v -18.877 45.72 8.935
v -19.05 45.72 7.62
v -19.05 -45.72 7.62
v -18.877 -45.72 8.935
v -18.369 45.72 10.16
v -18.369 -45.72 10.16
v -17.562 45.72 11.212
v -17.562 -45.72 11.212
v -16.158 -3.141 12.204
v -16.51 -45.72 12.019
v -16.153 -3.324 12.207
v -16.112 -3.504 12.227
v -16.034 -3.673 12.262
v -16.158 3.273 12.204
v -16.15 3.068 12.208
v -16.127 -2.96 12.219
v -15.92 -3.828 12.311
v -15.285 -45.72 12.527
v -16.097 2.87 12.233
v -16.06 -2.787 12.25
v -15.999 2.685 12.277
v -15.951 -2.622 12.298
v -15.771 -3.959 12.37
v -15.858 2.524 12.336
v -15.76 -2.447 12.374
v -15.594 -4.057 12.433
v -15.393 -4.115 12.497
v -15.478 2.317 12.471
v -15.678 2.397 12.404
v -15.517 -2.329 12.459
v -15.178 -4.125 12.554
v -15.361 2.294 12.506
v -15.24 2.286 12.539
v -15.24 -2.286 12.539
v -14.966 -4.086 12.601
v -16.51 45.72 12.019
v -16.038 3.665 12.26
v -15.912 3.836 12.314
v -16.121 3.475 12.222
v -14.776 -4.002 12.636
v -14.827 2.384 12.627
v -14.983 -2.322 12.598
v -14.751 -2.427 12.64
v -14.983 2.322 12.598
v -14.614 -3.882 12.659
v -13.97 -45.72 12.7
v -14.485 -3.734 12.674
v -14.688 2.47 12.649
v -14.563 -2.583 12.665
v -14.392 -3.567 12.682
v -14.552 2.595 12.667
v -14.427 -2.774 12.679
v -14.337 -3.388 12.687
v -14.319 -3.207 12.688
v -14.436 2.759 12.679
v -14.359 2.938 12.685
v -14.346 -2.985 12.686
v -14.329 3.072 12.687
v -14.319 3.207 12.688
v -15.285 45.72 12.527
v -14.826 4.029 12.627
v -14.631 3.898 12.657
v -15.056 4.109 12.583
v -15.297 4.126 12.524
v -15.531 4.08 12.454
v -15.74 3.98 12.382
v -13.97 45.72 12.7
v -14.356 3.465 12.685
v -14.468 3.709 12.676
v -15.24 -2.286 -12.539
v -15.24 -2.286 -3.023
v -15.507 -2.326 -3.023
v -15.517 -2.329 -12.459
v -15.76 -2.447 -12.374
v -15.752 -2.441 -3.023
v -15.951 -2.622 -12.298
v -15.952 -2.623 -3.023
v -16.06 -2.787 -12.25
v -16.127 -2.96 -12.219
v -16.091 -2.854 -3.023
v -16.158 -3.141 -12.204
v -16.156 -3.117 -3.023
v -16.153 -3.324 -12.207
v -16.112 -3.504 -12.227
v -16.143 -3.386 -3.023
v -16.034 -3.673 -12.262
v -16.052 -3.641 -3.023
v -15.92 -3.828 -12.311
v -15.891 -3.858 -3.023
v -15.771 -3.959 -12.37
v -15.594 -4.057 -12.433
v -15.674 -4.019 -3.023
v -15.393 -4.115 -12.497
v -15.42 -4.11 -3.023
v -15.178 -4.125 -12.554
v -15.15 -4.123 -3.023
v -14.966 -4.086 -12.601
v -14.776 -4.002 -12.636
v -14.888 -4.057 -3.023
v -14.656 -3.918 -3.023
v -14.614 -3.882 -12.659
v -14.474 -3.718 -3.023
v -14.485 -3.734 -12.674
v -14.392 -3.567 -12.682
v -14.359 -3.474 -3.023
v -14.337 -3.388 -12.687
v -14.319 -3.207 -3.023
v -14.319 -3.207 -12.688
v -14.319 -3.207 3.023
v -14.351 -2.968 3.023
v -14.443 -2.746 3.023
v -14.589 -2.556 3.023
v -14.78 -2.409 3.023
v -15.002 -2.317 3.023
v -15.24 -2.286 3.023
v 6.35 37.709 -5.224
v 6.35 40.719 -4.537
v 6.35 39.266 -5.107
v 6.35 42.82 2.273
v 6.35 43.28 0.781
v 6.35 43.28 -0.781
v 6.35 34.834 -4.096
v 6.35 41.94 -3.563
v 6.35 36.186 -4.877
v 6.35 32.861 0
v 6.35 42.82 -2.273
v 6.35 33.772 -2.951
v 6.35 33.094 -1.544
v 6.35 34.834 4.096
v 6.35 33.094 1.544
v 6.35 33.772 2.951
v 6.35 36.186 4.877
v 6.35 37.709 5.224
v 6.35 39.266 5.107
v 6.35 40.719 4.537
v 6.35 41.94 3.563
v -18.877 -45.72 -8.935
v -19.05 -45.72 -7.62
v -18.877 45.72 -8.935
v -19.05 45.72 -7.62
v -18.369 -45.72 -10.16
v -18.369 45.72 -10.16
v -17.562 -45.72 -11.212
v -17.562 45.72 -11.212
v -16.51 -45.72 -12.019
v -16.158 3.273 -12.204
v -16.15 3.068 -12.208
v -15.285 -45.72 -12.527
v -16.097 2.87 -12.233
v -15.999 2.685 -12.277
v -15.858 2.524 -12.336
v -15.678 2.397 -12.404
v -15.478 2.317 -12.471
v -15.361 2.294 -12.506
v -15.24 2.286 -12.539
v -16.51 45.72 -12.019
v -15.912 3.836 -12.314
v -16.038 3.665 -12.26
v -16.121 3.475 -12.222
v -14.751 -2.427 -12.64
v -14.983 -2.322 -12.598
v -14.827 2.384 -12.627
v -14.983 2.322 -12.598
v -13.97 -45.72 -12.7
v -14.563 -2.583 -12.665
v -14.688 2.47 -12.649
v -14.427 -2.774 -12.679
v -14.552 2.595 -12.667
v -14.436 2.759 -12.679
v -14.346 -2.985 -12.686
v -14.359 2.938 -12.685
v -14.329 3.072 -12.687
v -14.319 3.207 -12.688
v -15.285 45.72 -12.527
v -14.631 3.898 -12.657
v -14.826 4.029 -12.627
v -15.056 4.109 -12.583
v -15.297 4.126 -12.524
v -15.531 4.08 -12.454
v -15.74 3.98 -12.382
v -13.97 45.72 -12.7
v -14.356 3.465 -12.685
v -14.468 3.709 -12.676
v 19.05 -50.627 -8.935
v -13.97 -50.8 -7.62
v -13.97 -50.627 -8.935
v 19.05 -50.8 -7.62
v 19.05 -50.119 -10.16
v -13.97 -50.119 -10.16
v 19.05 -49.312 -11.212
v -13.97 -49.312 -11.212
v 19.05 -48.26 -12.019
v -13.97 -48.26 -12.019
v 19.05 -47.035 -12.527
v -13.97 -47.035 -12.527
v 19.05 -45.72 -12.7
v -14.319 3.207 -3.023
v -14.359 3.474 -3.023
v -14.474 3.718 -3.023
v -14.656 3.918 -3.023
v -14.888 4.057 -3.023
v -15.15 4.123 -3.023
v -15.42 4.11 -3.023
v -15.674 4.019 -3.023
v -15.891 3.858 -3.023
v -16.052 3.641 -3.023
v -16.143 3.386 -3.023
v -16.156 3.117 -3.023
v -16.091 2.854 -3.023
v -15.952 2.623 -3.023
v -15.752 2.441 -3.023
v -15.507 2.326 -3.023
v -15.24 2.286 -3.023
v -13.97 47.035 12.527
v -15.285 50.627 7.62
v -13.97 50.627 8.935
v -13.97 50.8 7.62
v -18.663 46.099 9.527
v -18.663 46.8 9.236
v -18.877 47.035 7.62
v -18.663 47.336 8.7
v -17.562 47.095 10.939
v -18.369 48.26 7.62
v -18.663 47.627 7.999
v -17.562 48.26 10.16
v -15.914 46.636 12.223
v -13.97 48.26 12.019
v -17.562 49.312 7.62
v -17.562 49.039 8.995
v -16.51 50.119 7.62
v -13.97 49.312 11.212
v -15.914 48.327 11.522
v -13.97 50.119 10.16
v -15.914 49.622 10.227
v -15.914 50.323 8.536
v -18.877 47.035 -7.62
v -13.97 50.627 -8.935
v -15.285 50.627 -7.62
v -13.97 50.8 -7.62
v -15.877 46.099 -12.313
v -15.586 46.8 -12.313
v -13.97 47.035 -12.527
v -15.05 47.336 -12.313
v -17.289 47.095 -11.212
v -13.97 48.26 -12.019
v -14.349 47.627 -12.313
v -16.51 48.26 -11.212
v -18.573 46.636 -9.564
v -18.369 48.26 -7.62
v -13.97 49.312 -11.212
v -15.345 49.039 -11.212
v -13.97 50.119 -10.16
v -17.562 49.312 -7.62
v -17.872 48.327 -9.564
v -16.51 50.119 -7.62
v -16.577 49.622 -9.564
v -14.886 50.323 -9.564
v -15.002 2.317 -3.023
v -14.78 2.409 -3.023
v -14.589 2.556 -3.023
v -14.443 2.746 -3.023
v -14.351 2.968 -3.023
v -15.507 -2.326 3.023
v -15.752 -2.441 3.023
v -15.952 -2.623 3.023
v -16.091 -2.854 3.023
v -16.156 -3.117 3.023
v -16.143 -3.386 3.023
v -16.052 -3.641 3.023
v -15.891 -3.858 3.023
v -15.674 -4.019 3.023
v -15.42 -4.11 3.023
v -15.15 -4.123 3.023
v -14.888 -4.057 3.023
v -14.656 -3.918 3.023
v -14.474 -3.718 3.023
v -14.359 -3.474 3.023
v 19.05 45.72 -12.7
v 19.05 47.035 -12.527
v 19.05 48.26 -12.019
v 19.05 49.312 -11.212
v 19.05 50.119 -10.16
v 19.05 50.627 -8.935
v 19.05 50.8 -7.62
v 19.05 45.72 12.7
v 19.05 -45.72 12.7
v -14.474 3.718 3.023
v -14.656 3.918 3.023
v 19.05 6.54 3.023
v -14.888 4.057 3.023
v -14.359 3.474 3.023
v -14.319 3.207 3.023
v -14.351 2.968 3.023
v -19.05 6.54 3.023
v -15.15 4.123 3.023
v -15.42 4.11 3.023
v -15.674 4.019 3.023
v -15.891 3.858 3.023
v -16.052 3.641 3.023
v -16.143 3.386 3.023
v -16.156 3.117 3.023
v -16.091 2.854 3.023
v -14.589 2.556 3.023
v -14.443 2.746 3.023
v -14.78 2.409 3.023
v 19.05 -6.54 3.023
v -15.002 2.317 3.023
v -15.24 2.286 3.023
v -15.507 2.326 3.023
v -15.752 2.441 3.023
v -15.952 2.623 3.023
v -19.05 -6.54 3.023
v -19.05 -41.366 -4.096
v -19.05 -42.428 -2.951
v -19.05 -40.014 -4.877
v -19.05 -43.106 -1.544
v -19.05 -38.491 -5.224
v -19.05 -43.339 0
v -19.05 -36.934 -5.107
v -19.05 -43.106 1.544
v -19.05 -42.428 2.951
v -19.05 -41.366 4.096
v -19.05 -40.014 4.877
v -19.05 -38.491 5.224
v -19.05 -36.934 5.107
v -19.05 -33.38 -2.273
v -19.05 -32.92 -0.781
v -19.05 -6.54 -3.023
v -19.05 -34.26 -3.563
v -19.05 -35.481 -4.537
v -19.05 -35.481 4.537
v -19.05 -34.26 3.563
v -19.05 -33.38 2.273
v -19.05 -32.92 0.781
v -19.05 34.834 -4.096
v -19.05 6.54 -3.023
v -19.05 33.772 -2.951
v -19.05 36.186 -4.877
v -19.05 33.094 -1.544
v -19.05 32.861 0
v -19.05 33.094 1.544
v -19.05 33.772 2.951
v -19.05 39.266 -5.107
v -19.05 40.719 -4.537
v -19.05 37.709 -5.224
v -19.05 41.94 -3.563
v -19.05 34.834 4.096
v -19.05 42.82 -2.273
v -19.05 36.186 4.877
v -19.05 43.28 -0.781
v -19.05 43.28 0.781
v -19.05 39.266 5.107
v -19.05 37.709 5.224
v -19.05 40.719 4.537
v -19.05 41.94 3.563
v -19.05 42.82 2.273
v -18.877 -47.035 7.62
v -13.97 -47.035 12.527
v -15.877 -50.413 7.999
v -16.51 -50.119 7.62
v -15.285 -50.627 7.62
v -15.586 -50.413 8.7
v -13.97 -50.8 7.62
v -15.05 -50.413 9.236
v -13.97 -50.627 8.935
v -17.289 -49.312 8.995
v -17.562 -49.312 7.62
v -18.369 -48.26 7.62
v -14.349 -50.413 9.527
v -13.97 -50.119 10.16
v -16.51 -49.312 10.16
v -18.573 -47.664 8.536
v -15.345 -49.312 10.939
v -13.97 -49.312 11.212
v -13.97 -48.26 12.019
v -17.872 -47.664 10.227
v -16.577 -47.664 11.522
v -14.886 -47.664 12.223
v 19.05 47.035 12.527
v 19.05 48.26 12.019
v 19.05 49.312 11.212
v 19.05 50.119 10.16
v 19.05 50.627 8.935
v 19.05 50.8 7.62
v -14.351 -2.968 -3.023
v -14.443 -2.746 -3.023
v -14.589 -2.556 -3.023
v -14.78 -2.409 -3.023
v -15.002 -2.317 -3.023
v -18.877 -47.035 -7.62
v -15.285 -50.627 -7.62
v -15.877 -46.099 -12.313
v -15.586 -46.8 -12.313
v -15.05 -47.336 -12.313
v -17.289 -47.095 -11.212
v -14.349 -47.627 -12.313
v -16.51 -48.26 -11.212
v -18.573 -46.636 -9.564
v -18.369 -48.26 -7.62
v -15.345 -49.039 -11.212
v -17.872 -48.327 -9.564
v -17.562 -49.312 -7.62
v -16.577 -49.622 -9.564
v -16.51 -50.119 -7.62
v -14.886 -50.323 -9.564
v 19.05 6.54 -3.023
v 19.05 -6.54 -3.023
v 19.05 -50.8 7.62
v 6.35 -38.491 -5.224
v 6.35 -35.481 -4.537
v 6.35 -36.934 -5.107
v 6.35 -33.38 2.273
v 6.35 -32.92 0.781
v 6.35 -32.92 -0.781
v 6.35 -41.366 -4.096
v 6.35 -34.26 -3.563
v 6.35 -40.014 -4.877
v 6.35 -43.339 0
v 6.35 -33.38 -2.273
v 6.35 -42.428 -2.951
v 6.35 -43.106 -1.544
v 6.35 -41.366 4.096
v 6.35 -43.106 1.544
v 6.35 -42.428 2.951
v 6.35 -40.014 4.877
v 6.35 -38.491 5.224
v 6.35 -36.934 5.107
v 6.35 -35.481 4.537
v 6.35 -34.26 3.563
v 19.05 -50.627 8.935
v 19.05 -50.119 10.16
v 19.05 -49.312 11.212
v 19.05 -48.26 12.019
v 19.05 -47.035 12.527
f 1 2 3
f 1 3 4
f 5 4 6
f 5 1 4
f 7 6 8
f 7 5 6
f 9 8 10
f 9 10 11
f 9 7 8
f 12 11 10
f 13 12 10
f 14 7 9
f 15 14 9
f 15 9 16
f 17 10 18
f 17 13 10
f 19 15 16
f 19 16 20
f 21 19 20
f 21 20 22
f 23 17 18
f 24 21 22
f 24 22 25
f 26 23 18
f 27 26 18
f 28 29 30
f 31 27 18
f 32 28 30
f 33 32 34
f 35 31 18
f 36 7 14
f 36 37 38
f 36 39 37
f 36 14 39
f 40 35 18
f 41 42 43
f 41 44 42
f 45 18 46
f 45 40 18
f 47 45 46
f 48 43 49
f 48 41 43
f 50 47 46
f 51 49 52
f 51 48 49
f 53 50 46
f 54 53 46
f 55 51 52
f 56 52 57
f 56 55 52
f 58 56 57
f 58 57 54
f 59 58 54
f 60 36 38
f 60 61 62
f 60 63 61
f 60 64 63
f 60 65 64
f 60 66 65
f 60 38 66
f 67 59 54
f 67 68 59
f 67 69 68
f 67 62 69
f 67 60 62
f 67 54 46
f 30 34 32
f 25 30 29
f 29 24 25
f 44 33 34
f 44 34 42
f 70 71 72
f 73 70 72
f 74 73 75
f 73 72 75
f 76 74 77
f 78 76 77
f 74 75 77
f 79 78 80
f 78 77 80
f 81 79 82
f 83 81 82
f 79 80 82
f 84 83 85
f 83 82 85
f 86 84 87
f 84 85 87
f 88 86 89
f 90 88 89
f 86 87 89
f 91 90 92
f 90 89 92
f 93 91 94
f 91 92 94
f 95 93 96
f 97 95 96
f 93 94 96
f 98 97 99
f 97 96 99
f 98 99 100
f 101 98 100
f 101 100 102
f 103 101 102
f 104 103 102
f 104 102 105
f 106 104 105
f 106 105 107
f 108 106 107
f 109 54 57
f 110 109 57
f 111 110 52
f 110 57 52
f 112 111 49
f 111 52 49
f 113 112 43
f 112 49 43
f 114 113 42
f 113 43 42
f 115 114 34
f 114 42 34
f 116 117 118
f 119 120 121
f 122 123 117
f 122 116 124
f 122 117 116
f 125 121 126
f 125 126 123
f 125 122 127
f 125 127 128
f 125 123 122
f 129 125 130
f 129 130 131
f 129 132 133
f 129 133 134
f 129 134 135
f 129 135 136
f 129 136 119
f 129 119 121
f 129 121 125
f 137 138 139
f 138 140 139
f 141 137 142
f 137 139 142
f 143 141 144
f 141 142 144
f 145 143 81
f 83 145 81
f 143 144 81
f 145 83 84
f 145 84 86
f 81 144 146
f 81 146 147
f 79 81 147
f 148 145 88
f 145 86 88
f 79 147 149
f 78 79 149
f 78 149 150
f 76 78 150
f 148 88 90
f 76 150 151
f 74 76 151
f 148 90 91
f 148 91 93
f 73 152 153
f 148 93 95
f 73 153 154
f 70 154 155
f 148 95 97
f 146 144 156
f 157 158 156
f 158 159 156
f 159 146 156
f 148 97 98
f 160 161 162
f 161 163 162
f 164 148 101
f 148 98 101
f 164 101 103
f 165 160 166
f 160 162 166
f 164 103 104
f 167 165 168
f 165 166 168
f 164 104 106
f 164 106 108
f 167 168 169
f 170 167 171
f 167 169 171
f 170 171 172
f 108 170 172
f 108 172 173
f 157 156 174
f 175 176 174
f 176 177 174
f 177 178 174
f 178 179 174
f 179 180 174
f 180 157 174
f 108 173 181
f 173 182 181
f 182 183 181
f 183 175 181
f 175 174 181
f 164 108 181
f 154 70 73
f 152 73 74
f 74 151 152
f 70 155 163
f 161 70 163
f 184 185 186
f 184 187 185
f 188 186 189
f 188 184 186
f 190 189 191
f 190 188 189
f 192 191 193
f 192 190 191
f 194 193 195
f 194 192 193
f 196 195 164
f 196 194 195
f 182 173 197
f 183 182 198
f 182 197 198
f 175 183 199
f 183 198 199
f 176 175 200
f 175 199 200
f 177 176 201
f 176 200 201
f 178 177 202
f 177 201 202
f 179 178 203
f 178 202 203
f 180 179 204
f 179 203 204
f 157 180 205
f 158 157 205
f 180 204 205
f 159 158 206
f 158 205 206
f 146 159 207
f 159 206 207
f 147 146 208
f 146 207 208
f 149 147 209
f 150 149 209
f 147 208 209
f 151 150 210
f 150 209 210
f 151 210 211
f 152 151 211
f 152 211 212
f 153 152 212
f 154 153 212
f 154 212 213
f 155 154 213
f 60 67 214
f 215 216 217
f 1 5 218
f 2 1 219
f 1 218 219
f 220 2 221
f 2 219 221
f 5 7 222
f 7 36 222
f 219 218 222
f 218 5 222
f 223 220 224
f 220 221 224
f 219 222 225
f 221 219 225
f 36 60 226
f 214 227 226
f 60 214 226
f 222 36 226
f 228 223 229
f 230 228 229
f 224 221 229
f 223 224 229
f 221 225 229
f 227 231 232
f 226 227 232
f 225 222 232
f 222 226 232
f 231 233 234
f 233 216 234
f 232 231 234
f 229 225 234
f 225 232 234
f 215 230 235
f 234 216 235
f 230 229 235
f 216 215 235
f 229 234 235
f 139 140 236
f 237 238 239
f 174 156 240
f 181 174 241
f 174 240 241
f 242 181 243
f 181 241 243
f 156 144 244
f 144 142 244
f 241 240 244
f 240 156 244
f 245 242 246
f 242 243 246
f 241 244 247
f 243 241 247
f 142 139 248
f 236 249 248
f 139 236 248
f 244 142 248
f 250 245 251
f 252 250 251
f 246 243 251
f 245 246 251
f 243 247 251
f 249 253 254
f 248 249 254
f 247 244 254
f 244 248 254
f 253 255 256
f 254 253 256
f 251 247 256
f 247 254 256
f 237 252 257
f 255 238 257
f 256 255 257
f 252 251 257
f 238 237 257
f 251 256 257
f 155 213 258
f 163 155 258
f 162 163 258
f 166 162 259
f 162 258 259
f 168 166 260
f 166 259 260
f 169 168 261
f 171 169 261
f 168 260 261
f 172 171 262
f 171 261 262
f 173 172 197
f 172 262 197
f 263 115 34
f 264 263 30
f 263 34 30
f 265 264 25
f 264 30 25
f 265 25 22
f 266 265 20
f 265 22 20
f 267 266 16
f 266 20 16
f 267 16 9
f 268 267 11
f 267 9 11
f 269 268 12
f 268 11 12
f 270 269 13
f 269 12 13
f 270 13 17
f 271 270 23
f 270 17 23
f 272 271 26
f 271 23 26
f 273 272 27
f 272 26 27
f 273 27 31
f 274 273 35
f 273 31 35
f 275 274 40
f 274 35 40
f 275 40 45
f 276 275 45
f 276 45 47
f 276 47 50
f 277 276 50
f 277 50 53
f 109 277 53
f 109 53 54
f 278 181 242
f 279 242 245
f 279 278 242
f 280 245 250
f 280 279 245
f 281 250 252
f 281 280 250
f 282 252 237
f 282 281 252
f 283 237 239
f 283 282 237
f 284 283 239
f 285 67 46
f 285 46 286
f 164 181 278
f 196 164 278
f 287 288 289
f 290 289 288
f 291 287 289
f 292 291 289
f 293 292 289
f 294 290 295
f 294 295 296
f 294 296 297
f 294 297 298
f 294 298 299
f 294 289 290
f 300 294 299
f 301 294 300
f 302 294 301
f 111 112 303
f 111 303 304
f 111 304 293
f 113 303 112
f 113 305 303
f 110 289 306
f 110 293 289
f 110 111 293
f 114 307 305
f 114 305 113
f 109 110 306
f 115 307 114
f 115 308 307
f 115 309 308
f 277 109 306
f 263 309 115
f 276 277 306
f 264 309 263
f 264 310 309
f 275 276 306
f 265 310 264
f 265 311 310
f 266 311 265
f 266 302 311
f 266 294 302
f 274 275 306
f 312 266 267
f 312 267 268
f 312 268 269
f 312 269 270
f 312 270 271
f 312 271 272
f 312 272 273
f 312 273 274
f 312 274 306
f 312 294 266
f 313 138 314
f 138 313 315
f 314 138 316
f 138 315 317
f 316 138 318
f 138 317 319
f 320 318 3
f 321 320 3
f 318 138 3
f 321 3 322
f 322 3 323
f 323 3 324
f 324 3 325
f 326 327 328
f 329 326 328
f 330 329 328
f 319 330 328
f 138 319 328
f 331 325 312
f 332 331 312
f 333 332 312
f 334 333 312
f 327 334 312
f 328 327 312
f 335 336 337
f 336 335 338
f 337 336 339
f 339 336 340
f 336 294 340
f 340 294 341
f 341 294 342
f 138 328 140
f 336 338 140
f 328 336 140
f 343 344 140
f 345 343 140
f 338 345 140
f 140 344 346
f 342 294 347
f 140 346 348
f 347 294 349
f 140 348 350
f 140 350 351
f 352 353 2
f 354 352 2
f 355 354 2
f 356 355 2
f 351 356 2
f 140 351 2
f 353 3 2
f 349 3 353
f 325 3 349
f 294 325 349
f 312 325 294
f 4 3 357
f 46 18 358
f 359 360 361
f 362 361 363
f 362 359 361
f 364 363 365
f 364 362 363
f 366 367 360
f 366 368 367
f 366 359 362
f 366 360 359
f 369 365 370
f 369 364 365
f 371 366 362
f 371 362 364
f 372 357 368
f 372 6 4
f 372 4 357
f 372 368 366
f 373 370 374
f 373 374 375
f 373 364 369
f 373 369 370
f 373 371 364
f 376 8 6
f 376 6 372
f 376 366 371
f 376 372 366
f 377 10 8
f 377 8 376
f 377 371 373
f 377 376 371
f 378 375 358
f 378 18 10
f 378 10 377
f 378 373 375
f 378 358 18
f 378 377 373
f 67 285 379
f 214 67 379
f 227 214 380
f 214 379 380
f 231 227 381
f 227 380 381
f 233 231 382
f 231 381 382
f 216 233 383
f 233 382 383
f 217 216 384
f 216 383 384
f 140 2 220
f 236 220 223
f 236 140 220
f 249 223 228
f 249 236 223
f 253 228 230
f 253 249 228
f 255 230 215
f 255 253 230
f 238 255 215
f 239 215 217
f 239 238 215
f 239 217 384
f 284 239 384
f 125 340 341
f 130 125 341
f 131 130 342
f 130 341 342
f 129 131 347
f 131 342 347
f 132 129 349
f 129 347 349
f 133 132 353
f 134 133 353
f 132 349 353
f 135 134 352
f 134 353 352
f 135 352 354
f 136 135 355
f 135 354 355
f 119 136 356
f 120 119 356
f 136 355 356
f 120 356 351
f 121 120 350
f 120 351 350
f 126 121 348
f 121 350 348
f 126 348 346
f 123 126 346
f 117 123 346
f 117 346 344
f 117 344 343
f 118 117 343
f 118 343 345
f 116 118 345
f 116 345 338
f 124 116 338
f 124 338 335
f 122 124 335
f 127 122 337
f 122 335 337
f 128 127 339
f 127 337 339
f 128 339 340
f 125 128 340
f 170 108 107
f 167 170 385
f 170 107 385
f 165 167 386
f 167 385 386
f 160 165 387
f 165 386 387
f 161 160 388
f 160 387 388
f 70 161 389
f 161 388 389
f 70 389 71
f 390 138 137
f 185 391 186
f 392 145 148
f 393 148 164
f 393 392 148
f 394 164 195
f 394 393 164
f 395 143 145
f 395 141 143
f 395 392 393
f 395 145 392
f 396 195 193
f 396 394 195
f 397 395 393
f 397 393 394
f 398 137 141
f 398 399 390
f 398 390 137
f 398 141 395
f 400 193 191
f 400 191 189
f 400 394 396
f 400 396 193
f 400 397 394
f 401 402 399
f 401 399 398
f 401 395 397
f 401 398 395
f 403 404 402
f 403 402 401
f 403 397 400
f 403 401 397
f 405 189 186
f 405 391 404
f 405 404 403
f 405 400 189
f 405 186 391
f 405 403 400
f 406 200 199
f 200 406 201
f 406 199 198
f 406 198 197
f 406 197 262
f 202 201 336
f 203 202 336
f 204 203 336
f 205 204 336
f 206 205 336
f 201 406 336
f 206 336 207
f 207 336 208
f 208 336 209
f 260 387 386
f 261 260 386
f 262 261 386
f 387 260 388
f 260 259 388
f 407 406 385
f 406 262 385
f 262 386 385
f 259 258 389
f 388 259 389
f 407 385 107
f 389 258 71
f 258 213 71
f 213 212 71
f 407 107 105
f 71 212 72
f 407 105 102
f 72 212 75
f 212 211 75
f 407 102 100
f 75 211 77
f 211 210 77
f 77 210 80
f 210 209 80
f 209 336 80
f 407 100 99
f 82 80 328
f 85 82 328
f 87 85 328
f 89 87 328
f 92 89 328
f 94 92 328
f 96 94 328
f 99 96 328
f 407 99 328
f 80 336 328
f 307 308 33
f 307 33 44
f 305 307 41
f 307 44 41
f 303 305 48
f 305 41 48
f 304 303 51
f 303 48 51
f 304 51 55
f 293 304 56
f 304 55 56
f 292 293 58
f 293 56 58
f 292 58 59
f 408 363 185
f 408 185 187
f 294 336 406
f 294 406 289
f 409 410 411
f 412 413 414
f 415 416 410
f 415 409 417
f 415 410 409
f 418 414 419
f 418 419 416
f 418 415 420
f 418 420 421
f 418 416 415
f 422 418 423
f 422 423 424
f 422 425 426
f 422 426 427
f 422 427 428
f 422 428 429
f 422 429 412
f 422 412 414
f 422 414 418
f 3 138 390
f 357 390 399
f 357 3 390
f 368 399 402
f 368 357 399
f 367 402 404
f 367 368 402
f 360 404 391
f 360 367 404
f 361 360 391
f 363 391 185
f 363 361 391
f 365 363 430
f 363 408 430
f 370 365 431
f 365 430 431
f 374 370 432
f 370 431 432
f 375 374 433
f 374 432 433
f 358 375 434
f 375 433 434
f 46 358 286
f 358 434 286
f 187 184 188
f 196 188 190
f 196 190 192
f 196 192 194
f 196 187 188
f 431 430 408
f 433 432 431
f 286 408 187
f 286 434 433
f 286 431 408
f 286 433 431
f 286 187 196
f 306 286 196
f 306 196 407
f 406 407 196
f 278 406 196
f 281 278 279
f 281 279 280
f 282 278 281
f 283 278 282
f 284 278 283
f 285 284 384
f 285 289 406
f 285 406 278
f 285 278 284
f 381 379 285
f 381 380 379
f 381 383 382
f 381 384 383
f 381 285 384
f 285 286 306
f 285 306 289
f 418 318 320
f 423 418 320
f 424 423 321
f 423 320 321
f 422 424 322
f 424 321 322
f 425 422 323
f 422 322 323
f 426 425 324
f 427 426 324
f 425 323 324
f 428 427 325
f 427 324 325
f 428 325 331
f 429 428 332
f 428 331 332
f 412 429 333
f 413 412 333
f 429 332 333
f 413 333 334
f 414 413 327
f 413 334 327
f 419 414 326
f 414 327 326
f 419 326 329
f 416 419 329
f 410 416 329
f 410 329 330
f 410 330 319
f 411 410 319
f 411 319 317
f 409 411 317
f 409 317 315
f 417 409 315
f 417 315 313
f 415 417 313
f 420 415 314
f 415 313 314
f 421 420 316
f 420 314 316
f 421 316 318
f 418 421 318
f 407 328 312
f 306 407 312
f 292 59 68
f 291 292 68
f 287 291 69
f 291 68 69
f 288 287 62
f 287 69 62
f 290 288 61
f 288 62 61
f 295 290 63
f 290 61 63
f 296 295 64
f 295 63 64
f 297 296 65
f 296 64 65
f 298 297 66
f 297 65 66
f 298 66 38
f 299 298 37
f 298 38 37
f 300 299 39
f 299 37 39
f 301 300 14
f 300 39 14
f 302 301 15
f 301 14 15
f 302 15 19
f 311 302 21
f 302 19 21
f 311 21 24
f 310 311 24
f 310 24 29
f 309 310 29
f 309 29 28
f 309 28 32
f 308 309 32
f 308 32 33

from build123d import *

# Parameters (mm, degrees)
F0_W     = 38.1
F0_H     = 101.6
F1_DEPTH = 12.7
F2_R     = 5.23875
F3_DEPTH = 25.4
F4_R     = 5.08
F5_W     = 13.081
F5_H     = 6.0452
F6_DEPTH = 38.1
F8_DEPTH = 25.401


with BuildPart() as f1:
    # F0 (on Top) → F1 (new body, symmetric)
    with BuildSketch(Plane.XY):
        Rectangle(F0_W, F0_H)
    extrude(amount=F1_DEPTH, both=True)

    # F2 (on face) → F3 (cut)
    with BuildSketch(Plane(origin=(-19.05, 0, 0), x_dir=(0, -1, 0), z_dir=(-1, 0, 0))):
        with Locations((38.1, 0)):
            Circle(F2_R)
        with Locations((-38.1, 0)):
            Circle(F2_R)
    extrude(amount=-F3_DEPTH, mode=Mode.SUBTRACT)

    # F4
    f4_edges = [f1.edges().sort_by_distance(p)[0] for p in [
        (0, 50.8, 12.7),
        (-19.05, 0, 12.7),
        (-19.05, 50.8, 0),
        (-19.05, -50.8, 0),
        (-19.05, 0, -12.7),
        (0, 50.8, -12.7),
        (0, -50.8, -12.7),
        (0, -50.8, 12.7),
    ]]
    fillet(f4_edges, radius=F4_R)

    # F5 (on face) → F6 (cut, through all)
    with BuildSketch(Plane(origin=(-19.05, 0, 0), x_dir=(0, -1, 0), z_dir=(-1, 0, 0))):
        Rectangle(F5_W, F5_H)
    extrude(amount=-F6_DEPTH, mode=Mode.SUBTRACT)

    # F7 (on face) → F8 (cut, through all)
    with BuildSketch(Plane.XY.offset(12.7)):
        with BuildLine():
            ThreePointArc((-14.31925, -3.20675), (-14.588931, -2.555681), (-15.24, -2.286))
            ThreePointArc((-15.24, -2.286), (-15.891069, -3.857819), (-14.31925, -3.20675))
        make_face()
        with BuildLine():
            ThreePointArc((-14.31925, 3.20675), (-15.891069, 3.857819), (-15.24, 2.286))
            ThreePointArc((-15.24, 2.286), (-14.588931, 2.555681), (-14.31925, 3.20675))
        make_face()
    extrude(amount=-F8_DEPTH, mode=Mode.SUBTRACT)


solid = f1.part
